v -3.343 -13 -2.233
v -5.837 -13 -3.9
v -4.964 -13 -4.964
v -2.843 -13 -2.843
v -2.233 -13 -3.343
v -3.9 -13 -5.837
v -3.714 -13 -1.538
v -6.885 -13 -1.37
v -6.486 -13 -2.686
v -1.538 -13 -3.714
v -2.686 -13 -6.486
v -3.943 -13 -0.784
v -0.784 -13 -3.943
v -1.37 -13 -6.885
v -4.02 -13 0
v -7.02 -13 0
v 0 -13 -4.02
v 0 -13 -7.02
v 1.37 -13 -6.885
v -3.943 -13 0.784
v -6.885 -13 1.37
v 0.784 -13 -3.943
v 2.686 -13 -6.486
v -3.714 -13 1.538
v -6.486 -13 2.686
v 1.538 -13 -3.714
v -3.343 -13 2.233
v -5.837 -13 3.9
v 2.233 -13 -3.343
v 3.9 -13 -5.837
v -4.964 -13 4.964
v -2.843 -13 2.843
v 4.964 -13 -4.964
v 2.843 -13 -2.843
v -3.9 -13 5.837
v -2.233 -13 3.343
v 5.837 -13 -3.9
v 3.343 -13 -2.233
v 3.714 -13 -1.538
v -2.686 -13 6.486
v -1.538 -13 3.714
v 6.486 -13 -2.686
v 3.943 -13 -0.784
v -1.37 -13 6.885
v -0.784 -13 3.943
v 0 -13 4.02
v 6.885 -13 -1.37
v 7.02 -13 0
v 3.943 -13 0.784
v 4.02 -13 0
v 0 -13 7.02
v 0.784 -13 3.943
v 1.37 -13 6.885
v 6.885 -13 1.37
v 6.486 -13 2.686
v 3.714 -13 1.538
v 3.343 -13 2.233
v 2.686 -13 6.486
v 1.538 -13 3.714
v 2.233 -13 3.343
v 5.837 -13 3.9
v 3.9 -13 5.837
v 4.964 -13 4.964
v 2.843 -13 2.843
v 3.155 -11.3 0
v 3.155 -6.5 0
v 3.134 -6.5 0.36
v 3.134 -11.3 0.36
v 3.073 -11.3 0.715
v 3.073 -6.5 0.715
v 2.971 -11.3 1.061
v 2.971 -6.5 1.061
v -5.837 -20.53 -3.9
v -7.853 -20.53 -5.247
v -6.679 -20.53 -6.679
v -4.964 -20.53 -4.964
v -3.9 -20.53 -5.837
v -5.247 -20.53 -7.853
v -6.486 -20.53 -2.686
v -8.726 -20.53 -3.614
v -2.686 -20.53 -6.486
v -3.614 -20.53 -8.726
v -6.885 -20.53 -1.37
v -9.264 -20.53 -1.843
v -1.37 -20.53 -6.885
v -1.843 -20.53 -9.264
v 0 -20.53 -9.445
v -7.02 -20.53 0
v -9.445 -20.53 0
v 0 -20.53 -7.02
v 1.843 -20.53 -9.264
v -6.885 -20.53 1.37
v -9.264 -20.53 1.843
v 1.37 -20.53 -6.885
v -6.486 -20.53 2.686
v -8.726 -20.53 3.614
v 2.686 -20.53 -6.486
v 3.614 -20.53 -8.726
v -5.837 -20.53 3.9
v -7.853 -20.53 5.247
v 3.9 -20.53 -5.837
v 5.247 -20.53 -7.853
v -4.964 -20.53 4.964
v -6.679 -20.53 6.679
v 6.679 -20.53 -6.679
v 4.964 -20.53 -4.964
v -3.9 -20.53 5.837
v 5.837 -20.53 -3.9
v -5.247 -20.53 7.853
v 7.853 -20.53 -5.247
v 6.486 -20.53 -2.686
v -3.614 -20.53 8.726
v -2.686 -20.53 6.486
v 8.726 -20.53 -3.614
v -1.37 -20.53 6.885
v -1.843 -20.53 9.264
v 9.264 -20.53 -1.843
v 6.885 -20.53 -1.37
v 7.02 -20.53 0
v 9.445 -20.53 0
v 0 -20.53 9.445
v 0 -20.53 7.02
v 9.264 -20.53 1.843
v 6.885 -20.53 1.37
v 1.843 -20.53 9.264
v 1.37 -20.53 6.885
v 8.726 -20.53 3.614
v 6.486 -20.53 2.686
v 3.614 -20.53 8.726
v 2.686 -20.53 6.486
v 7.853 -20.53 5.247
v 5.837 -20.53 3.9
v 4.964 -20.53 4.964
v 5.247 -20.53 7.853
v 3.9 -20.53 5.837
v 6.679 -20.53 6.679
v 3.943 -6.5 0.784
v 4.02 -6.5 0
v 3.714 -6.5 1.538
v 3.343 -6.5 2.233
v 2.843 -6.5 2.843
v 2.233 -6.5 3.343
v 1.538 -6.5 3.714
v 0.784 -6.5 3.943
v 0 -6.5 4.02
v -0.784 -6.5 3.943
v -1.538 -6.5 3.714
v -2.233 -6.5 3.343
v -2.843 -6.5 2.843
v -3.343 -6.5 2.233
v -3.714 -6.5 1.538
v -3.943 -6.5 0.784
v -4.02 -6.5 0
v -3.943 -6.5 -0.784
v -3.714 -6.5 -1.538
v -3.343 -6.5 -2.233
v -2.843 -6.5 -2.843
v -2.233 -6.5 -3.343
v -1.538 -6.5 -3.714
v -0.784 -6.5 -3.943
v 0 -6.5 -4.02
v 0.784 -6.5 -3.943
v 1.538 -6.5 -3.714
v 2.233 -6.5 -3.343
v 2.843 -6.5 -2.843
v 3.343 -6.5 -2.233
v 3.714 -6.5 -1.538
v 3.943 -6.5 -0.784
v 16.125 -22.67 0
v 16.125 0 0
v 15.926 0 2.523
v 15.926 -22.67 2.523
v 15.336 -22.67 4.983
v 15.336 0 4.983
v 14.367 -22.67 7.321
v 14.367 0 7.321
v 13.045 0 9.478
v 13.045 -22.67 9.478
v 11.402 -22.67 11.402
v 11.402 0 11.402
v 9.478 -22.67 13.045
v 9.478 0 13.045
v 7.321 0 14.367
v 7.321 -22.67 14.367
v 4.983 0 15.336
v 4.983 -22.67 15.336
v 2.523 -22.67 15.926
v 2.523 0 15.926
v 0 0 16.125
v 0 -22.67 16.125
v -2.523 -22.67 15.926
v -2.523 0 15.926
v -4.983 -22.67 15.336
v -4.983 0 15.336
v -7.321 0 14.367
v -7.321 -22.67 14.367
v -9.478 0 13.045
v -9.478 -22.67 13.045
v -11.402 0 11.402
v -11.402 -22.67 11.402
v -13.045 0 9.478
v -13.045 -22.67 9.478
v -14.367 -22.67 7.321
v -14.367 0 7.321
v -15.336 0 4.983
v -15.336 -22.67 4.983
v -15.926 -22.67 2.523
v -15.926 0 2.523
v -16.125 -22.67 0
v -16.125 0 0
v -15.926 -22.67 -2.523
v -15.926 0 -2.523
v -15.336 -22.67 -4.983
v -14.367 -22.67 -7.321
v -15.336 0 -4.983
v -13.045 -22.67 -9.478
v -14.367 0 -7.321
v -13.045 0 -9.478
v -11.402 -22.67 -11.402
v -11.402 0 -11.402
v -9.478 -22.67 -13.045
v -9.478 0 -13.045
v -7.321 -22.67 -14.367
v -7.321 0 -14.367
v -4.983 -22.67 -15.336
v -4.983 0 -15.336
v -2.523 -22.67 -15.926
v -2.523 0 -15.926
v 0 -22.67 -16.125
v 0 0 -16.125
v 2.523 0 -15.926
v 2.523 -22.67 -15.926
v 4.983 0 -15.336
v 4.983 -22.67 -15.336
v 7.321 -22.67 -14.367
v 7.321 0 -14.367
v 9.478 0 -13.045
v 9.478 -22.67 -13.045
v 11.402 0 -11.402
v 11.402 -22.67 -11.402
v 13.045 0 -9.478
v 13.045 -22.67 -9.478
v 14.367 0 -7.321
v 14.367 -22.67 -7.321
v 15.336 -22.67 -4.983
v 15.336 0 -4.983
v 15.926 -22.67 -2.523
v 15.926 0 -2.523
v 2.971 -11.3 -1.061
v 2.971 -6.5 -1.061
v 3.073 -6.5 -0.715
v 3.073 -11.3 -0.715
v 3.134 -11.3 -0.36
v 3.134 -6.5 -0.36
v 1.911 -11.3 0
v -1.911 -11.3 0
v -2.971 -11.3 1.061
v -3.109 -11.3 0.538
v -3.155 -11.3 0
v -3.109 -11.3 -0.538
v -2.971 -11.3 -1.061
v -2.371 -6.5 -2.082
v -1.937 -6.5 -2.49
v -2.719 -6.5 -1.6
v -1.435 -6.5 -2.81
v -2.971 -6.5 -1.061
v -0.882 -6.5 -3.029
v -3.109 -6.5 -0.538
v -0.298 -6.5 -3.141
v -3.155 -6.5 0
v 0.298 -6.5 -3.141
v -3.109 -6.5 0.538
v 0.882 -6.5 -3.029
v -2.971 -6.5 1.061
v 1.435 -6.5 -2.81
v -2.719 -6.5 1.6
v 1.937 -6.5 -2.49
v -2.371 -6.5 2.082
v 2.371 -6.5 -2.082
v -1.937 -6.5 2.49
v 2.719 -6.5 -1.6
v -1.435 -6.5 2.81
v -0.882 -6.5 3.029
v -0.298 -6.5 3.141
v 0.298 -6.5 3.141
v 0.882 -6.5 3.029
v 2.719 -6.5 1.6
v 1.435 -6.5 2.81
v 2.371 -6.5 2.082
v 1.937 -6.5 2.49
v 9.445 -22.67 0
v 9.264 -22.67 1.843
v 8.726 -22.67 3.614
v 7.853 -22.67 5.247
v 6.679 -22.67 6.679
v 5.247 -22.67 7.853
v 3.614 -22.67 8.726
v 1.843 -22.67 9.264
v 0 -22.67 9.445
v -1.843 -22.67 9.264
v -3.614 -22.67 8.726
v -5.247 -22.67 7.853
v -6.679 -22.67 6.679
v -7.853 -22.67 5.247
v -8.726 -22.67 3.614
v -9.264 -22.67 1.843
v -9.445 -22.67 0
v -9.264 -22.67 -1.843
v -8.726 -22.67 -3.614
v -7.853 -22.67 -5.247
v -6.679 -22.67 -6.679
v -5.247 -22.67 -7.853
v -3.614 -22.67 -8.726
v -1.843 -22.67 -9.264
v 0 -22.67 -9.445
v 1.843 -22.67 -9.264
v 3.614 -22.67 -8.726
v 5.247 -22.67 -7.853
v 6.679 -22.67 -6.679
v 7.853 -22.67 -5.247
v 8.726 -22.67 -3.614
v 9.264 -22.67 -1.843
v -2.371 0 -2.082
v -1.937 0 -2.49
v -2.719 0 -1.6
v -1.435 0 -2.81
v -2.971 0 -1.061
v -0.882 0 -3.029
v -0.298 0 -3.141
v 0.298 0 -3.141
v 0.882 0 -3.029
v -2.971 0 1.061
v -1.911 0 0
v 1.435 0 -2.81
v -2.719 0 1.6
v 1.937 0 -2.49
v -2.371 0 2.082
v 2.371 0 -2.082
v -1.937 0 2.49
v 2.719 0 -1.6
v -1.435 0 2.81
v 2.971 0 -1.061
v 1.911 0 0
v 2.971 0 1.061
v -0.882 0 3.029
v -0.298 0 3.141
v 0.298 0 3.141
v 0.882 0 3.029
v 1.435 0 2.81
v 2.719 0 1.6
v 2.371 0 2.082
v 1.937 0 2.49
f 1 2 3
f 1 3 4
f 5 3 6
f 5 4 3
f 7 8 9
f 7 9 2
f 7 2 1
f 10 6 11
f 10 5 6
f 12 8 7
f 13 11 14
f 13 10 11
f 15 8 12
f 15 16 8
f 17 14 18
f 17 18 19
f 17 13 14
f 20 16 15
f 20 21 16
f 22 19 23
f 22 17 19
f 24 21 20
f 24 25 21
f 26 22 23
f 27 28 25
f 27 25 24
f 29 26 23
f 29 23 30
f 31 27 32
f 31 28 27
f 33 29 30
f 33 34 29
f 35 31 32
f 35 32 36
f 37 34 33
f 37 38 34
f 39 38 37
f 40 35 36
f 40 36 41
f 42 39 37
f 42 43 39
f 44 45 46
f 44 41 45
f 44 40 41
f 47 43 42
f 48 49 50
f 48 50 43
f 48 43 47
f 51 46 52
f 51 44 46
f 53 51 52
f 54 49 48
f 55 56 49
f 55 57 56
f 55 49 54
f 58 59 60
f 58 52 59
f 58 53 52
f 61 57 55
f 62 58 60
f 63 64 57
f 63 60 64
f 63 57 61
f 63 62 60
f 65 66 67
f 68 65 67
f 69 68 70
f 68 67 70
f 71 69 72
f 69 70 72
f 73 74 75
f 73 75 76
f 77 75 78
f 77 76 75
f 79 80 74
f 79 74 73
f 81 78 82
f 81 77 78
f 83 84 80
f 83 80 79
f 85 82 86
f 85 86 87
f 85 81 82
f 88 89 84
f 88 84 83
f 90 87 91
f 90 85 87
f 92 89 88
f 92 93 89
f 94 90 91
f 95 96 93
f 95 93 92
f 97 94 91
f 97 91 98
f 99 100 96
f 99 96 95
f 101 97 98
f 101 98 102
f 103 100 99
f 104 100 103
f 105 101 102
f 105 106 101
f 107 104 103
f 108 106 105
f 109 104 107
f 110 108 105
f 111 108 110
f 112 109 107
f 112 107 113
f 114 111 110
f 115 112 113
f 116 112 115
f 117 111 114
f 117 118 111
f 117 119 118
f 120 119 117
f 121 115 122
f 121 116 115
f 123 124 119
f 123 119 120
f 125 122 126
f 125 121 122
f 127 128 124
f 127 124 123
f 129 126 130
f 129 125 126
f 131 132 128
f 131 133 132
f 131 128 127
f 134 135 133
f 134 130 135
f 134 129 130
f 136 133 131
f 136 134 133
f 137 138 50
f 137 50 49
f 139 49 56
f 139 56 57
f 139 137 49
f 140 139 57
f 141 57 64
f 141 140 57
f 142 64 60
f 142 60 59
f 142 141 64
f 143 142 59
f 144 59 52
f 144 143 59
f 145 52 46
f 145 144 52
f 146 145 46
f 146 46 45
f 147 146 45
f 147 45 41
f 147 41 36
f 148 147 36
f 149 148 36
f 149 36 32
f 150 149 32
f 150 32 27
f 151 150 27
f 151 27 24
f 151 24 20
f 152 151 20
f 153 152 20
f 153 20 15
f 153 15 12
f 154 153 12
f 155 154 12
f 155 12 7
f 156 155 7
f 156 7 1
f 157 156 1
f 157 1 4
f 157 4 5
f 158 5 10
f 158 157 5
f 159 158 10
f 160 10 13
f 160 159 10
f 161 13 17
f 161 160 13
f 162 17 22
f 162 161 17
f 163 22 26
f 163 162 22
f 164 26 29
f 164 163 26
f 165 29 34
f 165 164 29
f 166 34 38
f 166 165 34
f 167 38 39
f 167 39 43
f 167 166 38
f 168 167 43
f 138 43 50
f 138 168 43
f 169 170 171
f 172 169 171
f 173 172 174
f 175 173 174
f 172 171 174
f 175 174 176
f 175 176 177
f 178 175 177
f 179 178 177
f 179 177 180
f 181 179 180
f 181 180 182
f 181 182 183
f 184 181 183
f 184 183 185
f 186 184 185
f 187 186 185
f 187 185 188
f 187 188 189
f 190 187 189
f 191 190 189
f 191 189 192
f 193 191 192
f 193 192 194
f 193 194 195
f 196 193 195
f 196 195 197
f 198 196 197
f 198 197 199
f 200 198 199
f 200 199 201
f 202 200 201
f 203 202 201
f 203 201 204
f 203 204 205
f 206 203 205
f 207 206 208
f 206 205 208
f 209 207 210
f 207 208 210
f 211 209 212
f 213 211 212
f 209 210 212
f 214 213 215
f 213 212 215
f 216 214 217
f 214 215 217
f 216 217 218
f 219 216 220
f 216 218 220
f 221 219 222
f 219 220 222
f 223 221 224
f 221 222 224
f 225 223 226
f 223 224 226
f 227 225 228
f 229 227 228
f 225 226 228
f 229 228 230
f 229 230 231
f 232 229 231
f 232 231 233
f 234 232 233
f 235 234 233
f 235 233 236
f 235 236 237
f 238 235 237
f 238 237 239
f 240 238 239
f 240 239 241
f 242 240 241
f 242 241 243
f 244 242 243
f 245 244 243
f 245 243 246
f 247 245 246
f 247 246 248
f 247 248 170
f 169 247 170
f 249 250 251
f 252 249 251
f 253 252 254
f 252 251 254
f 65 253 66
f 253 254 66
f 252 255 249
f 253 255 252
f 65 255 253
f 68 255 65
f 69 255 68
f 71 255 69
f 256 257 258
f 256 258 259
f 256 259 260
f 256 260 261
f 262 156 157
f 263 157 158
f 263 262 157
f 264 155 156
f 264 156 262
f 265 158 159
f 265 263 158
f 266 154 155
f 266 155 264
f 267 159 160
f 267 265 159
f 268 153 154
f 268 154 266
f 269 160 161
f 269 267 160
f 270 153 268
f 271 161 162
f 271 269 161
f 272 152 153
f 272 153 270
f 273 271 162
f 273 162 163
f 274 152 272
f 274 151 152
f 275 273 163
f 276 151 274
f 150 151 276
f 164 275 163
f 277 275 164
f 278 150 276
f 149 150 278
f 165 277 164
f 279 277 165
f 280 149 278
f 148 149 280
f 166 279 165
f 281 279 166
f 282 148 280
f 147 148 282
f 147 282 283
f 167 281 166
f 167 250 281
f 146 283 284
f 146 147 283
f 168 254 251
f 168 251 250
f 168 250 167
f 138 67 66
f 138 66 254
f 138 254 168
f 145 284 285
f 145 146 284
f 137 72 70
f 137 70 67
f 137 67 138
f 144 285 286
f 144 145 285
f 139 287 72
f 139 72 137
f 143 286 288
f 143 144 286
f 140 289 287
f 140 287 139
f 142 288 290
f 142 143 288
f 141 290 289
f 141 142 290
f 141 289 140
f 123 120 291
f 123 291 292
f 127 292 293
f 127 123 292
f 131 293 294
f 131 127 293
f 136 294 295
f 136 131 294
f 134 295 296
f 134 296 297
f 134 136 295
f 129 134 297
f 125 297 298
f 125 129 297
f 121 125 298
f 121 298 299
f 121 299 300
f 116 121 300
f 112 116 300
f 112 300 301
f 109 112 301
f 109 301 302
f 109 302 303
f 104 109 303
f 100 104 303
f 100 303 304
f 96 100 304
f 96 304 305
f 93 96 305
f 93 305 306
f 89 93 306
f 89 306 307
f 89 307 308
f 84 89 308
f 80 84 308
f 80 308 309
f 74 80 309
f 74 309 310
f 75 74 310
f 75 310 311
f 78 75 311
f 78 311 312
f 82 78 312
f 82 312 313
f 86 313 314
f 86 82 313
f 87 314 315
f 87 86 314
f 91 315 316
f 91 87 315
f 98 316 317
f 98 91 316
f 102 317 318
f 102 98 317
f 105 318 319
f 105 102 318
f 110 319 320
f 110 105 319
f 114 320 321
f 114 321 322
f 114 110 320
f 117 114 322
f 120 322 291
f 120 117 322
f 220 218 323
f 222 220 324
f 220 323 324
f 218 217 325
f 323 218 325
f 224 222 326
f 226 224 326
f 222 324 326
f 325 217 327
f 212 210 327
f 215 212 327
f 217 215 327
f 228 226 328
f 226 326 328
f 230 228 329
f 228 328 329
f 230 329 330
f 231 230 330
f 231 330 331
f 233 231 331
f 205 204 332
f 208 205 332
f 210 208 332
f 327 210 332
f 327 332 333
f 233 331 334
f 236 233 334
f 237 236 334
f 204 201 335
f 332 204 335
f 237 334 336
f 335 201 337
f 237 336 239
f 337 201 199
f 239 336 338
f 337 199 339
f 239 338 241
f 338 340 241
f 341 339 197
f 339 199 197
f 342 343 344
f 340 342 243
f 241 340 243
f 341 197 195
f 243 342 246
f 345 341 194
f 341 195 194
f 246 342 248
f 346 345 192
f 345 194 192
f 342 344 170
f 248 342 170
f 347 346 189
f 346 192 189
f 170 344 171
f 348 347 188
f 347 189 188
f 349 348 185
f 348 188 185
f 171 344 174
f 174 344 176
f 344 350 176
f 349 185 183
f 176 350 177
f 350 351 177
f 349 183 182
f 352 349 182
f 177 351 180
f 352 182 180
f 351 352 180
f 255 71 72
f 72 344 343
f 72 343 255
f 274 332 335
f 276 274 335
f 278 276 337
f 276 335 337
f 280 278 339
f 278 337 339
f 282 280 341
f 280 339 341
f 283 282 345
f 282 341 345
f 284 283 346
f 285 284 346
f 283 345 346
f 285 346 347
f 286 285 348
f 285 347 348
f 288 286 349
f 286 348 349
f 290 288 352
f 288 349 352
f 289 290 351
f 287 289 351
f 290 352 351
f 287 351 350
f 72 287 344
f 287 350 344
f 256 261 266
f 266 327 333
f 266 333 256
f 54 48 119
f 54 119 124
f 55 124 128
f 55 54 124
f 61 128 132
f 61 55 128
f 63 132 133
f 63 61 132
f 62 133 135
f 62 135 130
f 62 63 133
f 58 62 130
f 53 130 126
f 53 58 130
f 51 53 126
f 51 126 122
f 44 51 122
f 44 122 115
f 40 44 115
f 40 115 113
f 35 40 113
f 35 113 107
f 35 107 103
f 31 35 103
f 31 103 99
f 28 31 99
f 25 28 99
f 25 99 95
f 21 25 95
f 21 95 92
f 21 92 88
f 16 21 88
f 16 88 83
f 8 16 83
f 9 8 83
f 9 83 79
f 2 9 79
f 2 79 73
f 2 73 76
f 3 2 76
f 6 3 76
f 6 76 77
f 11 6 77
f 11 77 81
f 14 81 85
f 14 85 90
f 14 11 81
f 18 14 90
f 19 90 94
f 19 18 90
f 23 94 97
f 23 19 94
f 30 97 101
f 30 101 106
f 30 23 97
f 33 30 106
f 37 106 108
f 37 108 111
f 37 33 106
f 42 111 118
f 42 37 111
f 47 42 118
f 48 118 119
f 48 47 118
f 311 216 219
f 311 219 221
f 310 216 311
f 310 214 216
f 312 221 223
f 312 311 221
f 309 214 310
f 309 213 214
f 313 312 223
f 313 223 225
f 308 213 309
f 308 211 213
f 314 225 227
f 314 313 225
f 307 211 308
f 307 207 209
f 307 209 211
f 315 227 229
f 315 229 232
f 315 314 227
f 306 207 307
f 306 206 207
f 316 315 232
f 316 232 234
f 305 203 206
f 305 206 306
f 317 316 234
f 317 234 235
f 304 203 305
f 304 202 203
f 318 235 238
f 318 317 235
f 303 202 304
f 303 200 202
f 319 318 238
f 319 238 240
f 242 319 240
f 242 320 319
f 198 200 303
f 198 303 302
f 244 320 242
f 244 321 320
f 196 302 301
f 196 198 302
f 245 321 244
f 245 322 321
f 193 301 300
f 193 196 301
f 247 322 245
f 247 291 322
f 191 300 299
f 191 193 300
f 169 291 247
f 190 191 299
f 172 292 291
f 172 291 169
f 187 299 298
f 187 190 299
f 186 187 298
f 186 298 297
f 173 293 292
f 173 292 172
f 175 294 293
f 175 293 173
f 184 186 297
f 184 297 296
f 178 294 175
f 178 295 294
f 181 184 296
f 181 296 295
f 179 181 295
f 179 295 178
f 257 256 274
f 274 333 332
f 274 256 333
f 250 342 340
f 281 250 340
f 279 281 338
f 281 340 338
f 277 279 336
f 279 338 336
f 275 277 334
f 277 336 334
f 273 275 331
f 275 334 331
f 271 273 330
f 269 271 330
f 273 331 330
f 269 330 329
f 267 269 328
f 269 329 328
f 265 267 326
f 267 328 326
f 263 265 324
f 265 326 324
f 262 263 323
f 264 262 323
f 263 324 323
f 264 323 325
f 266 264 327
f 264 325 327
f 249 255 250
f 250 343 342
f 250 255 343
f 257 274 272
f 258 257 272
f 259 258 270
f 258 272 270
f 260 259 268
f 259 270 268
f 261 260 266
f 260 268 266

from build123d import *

# Parameters (mm, degrees)
F0_R     = 16.125
F0_R_2   = 9.445
F1_DEPTH = 22.67
F0_R_3   = 7.02
F3_DEPTH = 20.53
F0_R_4   = 4.02
F5_DEPTH = 13
F6_DEPTH = 6.5
F7_DEPTH = 11.3


with BuildPart() as f1:
    # F0 (on Front) → F1 (new body)
    with BuildSketch(Plane.XZ):
        Circle(F0_R)
        Circle(F0_R_2, mode=Mode.SUBTRACT)
    extrude(amount=F1_DEPTH)

    # F0 (on Front) → F3 (join)
    with BuildSketch(Plane.XZ):
        Circle(F0_R_2)
        Circle(F0_R_3, mode=Mode.SUBTRACT)
    extrude(amount=F3_DEPTH)

    # F0 (on Front) → F5 (join)
    with BuildSketch(Plane.XZ):
        Circle(F0_R_3)
        Circle(F0_R_4, mode=Mode.SUBTRACT)
    extrude(amount=F5_DEPTH)

    # F0 (on Front) → F6 (join)
    with BuildSketch(Plane.XZ):
        Circle(F0_R_4)
        with BuildLine():
            ThreePointArc((2.971368, 1.06066), (3.108753, 0.538219), (3.155, 0))
            ThreePointArc((3.155, 0), (3.108753, -0.538219), (2.971368, -1.06066))
            ThreePointArc((2.971368, -1.06066), (0, -3.155), (-2.971368, -1.06066))
            ThreePointArc((-2.971368, -1.06066), (-3.155, 0), (-2.971368, 1.06066))
            ThreePointArc((-2.971368, 1.06066), (0, 3.155), (2.971368, 1.06066))
        make_face(mode=Mode.SUBTRACT)
    extrude(amount=F6_DEPTH)

    # F0 (on Front) → F7 (join)
    with BuildSketch(Plane.XZ):
        Circle(F0_R)
        Circle(F0_R_2, mode=Mode.SUBTRACT)
        with BuildLine():
            Line((-1.910707, 0), (-2.971368, 1.06066))
            ThreePointArc((-2.971368, 1.06066), (-3.155, 0), (-2.971368, -1.06066))
            Line((-2.971368, -1.06066), (-1.910707, 0))
        make_face()
        with BuildLine():
            ThreePointArc((2.971368, -1.06066), (3.108753, -0.538219), (3.155, 0))
            ThreePointArc((3.155, 0), (3.108753, 0.538219), (2.971368, 1.06066))
            Line((2.971368, 1.06066), (1.910707, 0))
            Line((1.910707, 0), (2.971368, -1.06066))
        make_face()
    extrude(amount=F7_DEPTH)


solid = f1.part
